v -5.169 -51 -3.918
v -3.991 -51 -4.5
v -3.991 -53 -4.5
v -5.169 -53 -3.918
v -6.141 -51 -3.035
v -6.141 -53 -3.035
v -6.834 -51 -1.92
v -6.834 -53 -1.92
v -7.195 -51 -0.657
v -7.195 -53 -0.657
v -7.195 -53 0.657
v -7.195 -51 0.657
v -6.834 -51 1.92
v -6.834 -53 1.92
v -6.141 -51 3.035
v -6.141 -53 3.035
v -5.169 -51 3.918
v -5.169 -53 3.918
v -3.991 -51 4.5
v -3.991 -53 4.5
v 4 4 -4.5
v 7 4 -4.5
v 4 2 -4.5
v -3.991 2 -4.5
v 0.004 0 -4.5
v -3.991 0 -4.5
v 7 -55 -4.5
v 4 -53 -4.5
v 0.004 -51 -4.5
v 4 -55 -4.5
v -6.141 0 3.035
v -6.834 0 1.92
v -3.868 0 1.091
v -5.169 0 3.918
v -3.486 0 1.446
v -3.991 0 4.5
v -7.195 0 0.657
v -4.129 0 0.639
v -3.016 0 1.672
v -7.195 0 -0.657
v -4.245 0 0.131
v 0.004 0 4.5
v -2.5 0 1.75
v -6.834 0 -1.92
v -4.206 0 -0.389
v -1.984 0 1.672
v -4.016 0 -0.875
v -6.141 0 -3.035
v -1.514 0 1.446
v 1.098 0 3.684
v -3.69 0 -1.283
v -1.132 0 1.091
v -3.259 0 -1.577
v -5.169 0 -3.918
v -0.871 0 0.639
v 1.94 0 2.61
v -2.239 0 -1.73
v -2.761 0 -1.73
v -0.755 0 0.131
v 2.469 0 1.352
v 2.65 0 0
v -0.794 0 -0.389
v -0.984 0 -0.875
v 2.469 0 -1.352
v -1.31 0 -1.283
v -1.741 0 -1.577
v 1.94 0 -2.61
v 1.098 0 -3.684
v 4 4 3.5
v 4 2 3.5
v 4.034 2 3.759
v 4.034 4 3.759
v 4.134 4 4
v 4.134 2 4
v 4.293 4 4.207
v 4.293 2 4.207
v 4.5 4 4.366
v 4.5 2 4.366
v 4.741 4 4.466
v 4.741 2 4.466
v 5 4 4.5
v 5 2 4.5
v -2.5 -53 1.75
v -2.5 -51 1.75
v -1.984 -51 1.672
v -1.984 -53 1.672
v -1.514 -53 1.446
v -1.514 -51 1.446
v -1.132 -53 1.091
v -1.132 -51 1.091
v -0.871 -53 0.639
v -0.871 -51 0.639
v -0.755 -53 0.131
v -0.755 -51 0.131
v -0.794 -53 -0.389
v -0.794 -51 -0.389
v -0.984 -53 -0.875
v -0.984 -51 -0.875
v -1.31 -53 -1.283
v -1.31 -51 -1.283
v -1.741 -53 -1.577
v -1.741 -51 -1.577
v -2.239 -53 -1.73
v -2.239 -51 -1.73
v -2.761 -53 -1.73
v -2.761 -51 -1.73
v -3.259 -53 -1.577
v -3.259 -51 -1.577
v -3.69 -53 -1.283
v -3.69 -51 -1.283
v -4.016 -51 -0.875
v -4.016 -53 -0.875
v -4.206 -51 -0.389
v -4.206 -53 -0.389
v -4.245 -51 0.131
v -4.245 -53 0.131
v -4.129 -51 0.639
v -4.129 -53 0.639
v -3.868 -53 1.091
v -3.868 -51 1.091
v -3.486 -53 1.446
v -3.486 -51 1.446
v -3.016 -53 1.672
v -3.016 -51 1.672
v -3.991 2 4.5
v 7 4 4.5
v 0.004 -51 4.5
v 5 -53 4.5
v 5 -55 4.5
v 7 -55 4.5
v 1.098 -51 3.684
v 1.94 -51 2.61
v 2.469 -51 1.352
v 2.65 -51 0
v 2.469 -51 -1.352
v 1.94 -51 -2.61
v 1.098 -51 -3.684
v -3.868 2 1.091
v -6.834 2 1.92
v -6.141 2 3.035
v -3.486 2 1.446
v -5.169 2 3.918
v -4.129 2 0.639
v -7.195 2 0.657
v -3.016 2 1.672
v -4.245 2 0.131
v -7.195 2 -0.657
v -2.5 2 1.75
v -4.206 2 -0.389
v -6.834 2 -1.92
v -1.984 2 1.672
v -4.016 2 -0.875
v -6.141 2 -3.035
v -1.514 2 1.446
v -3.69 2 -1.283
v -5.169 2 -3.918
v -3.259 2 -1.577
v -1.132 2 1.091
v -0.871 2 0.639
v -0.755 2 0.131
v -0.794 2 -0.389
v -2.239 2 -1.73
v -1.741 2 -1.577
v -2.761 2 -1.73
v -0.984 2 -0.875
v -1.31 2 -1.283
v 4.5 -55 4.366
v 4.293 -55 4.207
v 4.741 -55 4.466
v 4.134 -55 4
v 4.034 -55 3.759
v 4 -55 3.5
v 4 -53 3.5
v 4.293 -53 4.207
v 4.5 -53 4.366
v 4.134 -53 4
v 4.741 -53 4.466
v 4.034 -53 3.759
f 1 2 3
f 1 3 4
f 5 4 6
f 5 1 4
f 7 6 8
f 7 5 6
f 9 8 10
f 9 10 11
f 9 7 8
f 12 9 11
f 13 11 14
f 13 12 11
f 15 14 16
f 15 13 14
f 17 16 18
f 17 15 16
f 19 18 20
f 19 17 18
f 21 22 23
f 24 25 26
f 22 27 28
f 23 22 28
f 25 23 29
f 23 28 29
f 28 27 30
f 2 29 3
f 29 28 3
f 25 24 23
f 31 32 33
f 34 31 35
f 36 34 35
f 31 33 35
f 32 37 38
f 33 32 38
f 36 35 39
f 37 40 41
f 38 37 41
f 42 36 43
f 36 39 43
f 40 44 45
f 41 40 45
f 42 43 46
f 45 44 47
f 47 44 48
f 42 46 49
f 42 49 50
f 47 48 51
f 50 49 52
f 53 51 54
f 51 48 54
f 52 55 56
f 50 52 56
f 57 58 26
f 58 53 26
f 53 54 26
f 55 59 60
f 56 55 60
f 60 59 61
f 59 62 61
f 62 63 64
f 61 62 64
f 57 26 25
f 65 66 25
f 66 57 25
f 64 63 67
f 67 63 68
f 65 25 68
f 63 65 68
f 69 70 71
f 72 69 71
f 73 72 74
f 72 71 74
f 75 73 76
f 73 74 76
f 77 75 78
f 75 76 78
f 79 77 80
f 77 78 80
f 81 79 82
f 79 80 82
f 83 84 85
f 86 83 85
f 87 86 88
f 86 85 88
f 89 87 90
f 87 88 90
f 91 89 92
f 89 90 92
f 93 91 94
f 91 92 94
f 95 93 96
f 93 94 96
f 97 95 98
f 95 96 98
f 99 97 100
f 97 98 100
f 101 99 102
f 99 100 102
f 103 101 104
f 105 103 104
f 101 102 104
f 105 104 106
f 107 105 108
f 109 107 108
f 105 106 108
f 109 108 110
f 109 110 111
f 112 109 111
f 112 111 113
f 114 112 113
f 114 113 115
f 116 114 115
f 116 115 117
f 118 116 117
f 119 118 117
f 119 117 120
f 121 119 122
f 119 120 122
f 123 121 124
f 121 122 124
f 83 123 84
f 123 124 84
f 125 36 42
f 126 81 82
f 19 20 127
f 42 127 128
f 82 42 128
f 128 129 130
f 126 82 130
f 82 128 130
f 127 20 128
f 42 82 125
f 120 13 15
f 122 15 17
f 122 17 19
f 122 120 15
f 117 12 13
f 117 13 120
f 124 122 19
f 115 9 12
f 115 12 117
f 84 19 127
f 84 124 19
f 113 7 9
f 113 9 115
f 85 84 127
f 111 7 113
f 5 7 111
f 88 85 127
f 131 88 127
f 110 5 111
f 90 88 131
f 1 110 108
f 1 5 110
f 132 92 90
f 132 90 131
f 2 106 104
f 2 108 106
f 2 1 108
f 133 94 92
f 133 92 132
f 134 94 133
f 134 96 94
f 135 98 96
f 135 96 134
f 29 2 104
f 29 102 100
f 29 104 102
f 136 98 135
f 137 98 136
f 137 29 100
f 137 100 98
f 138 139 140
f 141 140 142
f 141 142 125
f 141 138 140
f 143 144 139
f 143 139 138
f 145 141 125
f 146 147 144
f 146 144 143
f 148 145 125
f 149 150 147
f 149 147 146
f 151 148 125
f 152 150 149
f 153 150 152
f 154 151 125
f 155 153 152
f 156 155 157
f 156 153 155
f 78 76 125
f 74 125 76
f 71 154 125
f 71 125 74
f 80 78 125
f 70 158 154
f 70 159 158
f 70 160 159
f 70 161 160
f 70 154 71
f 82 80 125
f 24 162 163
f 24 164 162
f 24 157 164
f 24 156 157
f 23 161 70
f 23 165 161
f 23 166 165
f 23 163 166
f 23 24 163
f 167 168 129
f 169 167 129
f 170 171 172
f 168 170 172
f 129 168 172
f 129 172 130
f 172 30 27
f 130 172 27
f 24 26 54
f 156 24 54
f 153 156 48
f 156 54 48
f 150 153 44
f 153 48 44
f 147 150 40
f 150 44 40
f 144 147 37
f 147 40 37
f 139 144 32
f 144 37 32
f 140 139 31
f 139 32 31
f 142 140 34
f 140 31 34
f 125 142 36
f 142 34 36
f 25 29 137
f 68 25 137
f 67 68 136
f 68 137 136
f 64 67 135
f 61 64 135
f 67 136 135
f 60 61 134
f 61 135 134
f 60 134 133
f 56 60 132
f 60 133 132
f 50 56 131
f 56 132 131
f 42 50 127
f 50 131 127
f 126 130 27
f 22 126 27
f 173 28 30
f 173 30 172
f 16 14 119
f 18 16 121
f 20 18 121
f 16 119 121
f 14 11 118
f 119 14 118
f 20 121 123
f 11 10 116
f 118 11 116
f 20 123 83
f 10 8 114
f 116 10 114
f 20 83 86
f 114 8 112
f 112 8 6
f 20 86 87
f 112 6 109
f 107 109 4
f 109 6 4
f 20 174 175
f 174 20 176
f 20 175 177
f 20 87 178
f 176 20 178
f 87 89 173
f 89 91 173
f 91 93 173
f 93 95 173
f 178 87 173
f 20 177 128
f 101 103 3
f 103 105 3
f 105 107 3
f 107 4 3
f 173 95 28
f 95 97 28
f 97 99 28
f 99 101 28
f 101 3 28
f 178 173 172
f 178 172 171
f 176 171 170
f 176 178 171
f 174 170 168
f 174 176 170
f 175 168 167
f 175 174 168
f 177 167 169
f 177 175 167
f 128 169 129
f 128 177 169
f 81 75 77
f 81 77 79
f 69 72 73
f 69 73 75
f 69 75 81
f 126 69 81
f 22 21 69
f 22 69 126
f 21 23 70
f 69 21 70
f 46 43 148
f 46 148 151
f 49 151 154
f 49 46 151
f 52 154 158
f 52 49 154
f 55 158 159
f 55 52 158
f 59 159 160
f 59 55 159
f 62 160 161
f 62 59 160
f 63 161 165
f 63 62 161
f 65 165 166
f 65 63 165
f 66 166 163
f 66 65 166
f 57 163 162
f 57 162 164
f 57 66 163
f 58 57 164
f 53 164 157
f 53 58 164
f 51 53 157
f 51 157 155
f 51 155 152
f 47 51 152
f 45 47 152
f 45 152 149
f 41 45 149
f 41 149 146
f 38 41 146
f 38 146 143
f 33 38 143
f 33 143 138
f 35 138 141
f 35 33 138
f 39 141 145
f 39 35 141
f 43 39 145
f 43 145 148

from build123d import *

# Parameters (mm, degrees)
SKETCH1_R           = 1.75
BOSS_EXTRUDE3_DEPTH = 2
BOSS_EXTRUDE4_DEPTH = 25.5
BOSS_EXTRUDE5_DEPTH = 4


with BuildPart() as part:
    # Sketch1 → Boss-Extrude3 (new body)
    with BuildSketch(Plane(origin=(0, 0, 0), x_dir=(1, 0, 0), z_dir=(0, 1, 0))):
        with BuildLine():
            ThreePointArc((-3.991008085, 4.5), (-7.240580672, 0), (-3.991008085, -4.5))
            Line((-3.991008085, -4.5), (7, -4.5))
            Line((7, -4.5), (7, 4.5))
            Line((7, 4.5), (-3.991008085, 4.5))
        make_face()
        with Locations((-2.5, 0)):
            Circle(SKETCH1_R, mode=Mode.SUBTRACT)
    extrude(amount=BOSS_EXTRUDE3_DEPTH)

    # Sketch1<3> → Boss-Extrude4 (add)
    with BuildSketch(Plane(origin=(0, 0, 0), x_dir=(1, 0, 0), z_dir=(0, 1, 0))):
        with BuildLine():
            ThreePointArc((0.004495957, 4.5), (2.65, 0), (0.004495957, -4.5))
            Line((0.004495957, -4.5), (7, -4.5))
            Line((7, -4.5), (7, 4.5))
            Line((7, 4.5), (0.004495957, 4.5))
        make_face()
    extrude(amount=-BOSS_EXTRUDE4_DEPTH)

    # Sketch1<5> → Boss-Extrude5 (add)
    with BuildSketch(Plane(origin=(0, 0, 0), x_dir=(1, 0, 0), z_dir=(0, 1, 0))):
        with BuildLine():
            Line((5.019474666, 4.5), (4, 4.5))
            Line((4, 4.5), (4, -3.5))
            ThreePointArc((4, -3.5), (4.292893219, -4.207106781), (5, -4.5))
            Line((5, -4.5), (7, -4.5))
            Line((7, -4.5), (7, 4.5))
            Line((7, 4.5), (5.019474666, 4.5))
        make_face()
    extrude(amount=BOSS_EXTRUDE5_DEPTH)

    # Mirror1: part across plane


with BuildPart() as part_1:
    add(part.part)
    add(part.part.mirror(Plane.ZX.offset(-25.5)))


solid = part_1.part
